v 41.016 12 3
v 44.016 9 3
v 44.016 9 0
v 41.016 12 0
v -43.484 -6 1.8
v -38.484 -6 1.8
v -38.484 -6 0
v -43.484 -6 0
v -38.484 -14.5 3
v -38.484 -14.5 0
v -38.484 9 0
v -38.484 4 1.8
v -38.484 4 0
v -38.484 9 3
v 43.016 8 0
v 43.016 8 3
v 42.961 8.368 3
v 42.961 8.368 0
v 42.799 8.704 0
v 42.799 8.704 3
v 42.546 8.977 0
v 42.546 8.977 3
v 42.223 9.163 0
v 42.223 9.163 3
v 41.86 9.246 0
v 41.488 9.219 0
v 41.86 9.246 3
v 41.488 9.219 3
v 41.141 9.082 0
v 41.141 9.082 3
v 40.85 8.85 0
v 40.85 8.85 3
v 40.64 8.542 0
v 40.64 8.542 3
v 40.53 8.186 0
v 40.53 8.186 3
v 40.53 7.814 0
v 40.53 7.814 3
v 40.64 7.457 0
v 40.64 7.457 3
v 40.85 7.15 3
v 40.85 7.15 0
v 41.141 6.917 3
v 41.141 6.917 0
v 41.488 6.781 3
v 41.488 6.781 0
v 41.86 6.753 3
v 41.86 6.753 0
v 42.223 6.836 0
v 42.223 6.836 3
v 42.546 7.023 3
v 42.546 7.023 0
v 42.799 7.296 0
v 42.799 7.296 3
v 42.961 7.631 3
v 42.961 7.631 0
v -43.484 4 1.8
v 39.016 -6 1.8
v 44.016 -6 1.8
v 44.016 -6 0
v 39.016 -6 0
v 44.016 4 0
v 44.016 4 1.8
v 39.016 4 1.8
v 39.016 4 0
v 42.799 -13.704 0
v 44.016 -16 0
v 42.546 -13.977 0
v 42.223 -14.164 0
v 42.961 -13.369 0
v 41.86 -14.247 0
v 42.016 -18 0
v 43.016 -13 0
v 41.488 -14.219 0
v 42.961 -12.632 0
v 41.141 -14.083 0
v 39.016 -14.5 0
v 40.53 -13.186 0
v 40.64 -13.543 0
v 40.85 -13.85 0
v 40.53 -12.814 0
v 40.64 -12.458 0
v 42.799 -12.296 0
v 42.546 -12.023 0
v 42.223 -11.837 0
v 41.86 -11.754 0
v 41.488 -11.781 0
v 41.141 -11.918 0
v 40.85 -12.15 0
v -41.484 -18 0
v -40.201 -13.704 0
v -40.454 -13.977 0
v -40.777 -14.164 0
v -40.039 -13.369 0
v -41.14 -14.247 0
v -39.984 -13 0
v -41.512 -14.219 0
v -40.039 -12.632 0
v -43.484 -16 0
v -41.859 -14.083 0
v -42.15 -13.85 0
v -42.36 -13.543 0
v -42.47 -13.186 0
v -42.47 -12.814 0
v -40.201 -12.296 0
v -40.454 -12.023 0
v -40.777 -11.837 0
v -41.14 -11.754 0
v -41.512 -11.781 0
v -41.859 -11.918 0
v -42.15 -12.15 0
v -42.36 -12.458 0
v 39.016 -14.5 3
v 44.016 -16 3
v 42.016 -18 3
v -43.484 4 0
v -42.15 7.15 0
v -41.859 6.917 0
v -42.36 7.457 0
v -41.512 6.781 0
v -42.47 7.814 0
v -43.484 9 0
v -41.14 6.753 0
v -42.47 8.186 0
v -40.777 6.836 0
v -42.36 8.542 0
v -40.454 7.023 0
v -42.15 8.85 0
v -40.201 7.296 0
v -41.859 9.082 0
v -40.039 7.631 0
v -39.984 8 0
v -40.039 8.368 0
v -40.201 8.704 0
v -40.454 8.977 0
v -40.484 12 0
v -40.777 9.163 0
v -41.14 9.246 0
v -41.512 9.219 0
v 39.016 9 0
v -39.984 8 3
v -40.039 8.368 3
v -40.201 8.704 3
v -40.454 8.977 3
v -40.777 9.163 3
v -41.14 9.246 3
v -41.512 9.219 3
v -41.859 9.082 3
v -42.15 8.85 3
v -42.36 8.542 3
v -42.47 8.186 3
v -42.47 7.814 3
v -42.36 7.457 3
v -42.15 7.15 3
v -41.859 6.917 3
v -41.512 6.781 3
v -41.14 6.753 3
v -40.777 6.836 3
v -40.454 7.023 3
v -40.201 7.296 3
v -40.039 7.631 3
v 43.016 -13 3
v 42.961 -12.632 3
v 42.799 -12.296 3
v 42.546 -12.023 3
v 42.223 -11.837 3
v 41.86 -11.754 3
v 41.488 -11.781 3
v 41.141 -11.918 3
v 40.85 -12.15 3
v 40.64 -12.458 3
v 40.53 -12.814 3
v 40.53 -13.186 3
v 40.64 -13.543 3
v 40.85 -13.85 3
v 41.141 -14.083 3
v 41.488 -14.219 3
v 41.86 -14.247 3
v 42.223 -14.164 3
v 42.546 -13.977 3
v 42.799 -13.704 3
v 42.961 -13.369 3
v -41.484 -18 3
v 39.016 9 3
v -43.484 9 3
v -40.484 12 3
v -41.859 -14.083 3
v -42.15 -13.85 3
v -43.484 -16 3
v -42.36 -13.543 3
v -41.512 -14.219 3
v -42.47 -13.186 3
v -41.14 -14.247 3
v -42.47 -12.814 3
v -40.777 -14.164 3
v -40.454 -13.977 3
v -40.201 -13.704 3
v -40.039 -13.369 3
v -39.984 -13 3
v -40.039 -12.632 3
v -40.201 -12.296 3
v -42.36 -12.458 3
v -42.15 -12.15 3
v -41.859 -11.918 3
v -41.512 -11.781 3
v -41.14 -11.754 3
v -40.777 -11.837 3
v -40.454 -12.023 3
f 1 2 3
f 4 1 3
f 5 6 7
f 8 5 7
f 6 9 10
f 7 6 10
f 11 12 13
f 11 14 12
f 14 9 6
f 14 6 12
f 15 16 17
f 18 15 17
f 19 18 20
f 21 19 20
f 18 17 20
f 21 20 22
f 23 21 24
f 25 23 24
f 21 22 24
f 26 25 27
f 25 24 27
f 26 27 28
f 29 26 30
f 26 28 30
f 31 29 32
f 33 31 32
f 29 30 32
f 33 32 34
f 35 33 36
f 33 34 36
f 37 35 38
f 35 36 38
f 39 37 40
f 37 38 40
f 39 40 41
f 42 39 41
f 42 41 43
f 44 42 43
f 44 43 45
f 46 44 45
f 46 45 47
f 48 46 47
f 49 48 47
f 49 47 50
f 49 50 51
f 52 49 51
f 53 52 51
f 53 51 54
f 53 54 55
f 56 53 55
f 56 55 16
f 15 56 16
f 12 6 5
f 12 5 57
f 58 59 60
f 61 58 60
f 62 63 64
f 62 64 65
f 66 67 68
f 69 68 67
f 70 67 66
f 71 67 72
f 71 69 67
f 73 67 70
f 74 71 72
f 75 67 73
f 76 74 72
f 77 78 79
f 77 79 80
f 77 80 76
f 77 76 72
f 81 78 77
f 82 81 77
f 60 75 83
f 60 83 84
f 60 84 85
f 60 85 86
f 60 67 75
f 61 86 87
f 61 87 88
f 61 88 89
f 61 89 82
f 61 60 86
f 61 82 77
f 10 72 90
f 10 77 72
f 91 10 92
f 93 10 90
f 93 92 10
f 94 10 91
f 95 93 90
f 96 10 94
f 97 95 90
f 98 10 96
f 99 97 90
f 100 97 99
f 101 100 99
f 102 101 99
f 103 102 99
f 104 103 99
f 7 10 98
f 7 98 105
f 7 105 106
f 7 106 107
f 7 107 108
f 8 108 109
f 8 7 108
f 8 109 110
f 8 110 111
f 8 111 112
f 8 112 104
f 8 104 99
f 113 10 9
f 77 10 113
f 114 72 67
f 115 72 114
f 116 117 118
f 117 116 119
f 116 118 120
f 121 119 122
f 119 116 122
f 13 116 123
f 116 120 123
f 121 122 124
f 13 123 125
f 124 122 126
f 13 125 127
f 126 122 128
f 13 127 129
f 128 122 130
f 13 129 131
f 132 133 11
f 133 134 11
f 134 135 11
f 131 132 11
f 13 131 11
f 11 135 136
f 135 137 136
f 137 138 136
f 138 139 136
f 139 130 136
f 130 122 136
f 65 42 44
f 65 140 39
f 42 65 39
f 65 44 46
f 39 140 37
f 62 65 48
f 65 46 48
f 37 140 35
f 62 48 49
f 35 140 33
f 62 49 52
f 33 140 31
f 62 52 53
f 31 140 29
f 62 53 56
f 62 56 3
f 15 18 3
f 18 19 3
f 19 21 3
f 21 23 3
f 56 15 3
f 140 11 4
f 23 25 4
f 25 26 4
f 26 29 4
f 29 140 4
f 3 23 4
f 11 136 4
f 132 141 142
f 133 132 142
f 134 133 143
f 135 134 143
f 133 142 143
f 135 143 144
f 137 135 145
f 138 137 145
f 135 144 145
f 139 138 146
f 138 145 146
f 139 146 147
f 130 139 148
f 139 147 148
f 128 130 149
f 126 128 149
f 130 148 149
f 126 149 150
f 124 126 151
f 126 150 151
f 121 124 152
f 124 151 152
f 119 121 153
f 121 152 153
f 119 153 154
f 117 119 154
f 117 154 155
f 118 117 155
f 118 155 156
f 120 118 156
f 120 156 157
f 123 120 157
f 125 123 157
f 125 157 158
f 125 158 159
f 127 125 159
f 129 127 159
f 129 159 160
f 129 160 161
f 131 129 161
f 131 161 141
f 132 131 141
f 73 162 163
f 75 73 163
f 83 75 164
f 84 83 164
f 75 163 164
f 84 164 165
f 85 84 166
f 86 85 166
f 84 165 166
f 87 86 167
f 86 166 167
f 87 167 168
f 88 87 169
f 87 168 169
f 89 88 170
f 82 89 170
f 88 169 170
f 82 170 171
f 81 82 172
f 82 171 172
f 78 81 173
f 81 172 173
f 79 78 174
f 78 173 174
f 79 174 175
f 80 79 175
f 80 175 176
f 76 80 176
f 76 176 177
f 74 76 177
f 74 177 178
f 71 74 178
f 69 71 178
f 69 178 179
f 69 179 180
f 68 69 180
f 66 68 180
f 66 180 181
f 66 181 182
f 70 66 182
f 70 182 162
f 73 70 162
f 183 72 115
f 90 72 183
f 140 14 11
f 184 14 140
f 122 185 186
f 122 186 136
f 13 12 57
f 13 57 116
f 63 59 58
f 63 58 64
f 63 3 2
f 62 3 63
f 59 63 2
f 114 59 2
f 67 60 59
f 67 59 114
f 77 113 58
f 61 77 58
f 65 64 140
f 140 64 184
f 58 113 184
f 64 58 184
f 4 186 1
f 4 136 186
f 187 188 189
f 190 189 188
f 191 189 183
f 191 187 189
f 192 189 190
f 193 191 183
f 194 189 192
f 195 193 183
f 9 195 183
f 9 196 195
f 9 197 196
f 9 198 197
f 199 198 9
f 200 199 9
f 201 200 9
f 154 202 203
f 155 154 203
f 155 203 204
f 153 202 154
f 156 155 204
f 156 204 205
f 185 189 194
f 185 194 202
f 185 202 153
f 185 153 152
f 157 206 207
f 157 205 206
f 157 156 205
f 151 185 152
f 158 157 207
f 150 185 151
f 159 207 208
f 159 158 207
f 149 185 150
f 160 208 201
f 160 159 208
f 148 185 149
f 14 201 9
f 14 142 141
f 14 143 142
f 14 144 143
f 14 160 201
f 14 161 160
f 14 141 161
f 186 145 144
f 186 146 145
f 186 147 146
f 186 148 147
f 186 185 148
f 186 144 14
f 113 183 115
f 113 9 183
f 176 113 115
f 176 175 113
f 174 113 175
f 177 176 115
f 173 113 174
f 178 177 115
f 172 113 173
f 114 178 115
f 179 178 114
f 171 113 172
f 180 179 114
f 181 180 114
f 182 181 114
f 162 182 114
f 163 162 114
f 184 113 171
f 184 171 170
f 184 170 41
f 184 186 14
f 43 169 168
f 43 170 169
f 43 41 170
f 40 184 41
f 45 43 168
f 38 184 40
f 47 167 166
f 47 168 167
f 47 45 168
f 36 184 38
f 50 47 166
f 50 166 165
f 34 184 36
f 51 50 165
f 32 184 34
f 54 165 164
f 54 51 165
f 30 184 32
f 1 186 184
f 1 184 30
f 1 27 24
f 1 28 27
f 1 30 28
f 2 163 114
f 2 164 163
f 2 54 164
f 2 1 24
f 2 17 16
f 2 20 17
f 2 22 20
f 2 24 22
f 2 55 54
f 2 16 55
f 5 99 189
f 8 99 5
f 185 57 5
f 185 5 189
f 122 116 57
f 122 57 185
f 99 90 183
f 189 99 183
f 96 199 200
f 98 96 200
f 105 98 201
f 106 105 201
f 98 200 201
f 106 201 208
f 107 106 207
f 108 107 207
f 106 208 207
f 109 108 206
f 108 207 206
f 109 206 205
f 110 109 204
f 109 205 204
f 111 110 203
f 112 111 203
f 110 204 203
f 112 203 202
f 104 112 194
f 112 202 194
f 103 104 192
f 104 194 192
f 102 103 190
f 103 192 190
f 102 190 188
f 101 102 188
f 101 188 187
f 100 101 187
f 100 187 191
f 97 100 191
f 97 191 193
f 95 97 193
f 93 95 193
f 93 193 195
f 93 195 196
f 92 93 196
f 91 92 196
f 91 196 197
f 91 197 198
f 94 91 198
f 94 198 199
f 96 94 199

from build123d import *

# Parameters (mm, degrees)
SKETCH_1_W          = 87.5
SKETCH_1_H          = 28
EXTRUDE_1_DEPTH     = 3
SKETCH_2_R          = 1.25
SKETCH_2_W          = 77.5
SKETCH_2_H          = 22.5
CUT_EXTRUDE_1_DEPTH = 44
CHAMFER_1_SIZE      = 1
SKETCH_4_W          = 1.8
SKETCH_4_H          = 10
CUT_EXTRUDE_2_DEPTH = 92
SKETCH_5_W          = 3
SKETCH_5_H          = 3
EXTRUDE_2_DEPTH     = 87.5
EXTRUDE_3_DEPTH     = 3
SKETCH_8_W          = 77.5
SKETCH_8_H          = 3
CUT_EXTRUDE_3_DEPTH = 4
CHAMFER_3_SIZE      = 2
SKETCH_9_W          = 77.5
SKETCH_9_H          = 3
EXTRUDE_4_DEPTH     = 3
SKETCH_10_W         = 87.5
SKETCH_10_H         = 3
CUT_EXTRUDE_4_DEPTH = 3
CHAMFER_4_SIZE      = 3


with BuildPart() as part:
    # 草图1 → 凸台-拉伸1 (new body)
    with BuildSketch(Plane.XY):
        with Locations((0.266227181, -2.000151732)):
            Rectangle(SKETCH_1_W, SKETCH_1_H)
    extrude(amount=EXTRUDE_1_DEPTH)

    # 草图2 → 切除-拉伸1 (cut)
    with BuildSketch(Plane.XY.offset(3)):
        with Locations((-41.233772819, 7.999848268)):
            Circle(SKETCH_2_R)
        with Locations((-41.233772819, -13.000151732)):
            Circle(SKETCH_2_R)
        with Locations((41.766227181, -13.000151732)):
            Circle(SKETCH_2_R)
        with Locations((41.766227181, 7.999848268)):
            Circle(SKETCH_2_R)
        with Locations((0.266227181, 0.749848268)):
            Rectangle(SKETCH_2_W, SKETCH_2_H)
    extrude(amount=-CUT_EXTRUDE_1_DEPTH, mode=Mode.SUBTRACT)

    # 倒角1
    chamfer_1_edges = [part.edges().sort_by_distance(p)[0] for p in [
        (44.016227181, -16.000151732, 1.5),
        (-43.483772819, -16.000151732, 1.5),
    ]]
    chamfer(chamfer_1_edges, length=CHAMFER_1_SIZE)

    # 草图4 → 切除-拉伸2 (cut)
    with BuildSketch(Plane(origin=(44.016227181, 0, 0), x_dir=(0, 0, -1), z_dir=(1, 0, 0))):
        with Locations((-0.9, -1.000151732)):
            Rectangle(SKETCH_4_W, SKETCH_4_H)
    extrude(amount=-CUT_EXTRUDE_2_DEPTH, mode=Mode.SUBTRACT)

    # 草图5 → 凸台-拉伸2 (add)
    with BuildSketch(Plane(origin=(44.016227181, 0, 0), x_dir=(0, 0, -1), z_dir=(1, 0, 0))):
        with Locations((-1.5, 13.499848268)):
            Rectangle(SKETCH_5_W, SKETCH_5_H)
    extrude(amount=-EXTRUDE_2_DEPTH)

    # 草图7 → 凸台-拉伸3 (add)
    with BuildSketch(Plane(origin=(0, 0, 0), x_dir=(-1, 0, 0), z_dir=(0, 0, -1))):
        Polygon((-44.016227181, -15.000151732), (-44.016227181, -18.000151732), (43.483772819, -18.000151732), (43.483772819, -15.000151732), (42.983772819, -15.500151732), (-43.016227181, -16.000151732), align=None)
    extrude(amount=-EXTRUDE_3_DEPTH)

    # 草图8 → 切除-拉伸3 (cut)
    with BuildSketch(Plane(origin=(0, -10.500151732, 0), x_dir=(1, 0, 0), z_dir=(0, 1, 0))):
        with Locations((0.266227181, -1.5)):
            Rectangle(SKETCH_8_W, SKETCH_8_H)
    extrude(amount=-CUT_EXTRUDE_3_DEPTH, mode=Mode.SUBTRACT)

    # 倒角3
    chamfer_3_edges = [part.edges().sort_by_distance(p)[0] for p in [
        (44.016227181, -18.000151732, 1.5),
        (-43.483772819, -18.000151732, 1.5),
    ]]
    chamfer(chamfer_3_edges, length=CHAMFER_3_SIZE)

    # 草图9 → 凸台-拉伸4 (add)
    with BuildSketch(Plane.XZ.offset(-11.999848268)):
        with Locations((0.266227181, 1.5)):
            Rectangle(SKETCH_9_W, SKETCH_9_H)
    extrude(amount=EXTRUDE_4_DEPTH)

    # 草图10 → 切除-拉伸4 (cut)
    with BuildSketch(Plane(origin=(0, 14.999848268, 0), x_dir=(1, 0, 0), z_dir=(0, 1, 0))):
        with Locations((0.266227181, -1.5)):
            Rectangle(SKETCH_10_W, SKETCH_10_H)
    extrude(amount=-CUT_EXTRUDE_4_DEPTH, mode=Mode.SUBTRACT)

    # 倒角4
    chamfer_4_edges = [part.edges().sort_by_distance(p)[0] for p in [
        (-43.483772819, 11.999848268, 1.5),
        (44.016227181, 11.999848268, 1.5),
    ]]
    chamfer(chamfer_4_edges, length=CHAMFER_4_SIZE)


solid = part.part
